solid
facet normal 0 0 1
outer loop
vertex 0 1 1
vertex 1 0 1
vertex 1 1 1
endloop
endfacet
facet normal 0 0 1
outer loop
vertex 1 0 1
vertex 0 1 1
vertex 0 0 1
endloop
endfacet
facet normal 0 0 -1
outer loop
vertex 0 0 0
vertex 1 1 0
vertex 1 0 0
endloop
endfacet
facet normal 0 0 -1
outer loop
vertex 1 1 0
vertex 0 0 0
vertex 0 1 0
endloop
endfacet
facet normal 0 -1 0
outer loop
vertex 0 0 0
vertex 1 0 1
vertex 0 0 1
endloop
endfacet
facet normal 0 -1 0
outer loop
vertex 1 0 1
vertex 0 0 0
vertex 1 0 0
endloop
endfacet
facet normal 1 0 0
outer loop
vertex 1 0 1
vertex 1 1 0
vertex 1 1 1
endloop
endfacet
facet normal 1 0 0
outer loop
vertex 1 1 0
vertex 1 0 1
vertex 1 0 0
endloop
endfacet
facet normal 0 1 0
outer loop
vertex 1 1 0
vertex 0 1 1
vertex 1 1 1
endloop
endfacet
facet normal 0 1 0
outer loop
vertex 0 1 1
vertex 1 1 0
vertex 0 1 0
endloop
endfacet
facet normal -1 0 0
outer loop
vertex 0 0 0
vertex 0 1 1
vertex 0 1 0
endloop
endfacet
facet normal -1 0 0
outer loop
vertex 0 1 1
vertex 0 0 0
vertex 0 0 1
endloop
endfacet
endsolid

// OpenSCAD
list = [1, 2, 3, 4, 5];
echo("List:", list);
echo("Length of list:", len(list));

text = "hello";
echo("String:", text);
echo("Length of string:", len(text));

value = 42;
echo("String conversion:", str(value));
echo("Bool to string:", str(true));

table = [[1, "one"], [2, "two"], [3, "three"]];
echo("Table:", table);
echo("Lookup 2 in table:", lookup(2, table));
echo("Lookup 3 in table:", lookup(3, table));

cube(1);
